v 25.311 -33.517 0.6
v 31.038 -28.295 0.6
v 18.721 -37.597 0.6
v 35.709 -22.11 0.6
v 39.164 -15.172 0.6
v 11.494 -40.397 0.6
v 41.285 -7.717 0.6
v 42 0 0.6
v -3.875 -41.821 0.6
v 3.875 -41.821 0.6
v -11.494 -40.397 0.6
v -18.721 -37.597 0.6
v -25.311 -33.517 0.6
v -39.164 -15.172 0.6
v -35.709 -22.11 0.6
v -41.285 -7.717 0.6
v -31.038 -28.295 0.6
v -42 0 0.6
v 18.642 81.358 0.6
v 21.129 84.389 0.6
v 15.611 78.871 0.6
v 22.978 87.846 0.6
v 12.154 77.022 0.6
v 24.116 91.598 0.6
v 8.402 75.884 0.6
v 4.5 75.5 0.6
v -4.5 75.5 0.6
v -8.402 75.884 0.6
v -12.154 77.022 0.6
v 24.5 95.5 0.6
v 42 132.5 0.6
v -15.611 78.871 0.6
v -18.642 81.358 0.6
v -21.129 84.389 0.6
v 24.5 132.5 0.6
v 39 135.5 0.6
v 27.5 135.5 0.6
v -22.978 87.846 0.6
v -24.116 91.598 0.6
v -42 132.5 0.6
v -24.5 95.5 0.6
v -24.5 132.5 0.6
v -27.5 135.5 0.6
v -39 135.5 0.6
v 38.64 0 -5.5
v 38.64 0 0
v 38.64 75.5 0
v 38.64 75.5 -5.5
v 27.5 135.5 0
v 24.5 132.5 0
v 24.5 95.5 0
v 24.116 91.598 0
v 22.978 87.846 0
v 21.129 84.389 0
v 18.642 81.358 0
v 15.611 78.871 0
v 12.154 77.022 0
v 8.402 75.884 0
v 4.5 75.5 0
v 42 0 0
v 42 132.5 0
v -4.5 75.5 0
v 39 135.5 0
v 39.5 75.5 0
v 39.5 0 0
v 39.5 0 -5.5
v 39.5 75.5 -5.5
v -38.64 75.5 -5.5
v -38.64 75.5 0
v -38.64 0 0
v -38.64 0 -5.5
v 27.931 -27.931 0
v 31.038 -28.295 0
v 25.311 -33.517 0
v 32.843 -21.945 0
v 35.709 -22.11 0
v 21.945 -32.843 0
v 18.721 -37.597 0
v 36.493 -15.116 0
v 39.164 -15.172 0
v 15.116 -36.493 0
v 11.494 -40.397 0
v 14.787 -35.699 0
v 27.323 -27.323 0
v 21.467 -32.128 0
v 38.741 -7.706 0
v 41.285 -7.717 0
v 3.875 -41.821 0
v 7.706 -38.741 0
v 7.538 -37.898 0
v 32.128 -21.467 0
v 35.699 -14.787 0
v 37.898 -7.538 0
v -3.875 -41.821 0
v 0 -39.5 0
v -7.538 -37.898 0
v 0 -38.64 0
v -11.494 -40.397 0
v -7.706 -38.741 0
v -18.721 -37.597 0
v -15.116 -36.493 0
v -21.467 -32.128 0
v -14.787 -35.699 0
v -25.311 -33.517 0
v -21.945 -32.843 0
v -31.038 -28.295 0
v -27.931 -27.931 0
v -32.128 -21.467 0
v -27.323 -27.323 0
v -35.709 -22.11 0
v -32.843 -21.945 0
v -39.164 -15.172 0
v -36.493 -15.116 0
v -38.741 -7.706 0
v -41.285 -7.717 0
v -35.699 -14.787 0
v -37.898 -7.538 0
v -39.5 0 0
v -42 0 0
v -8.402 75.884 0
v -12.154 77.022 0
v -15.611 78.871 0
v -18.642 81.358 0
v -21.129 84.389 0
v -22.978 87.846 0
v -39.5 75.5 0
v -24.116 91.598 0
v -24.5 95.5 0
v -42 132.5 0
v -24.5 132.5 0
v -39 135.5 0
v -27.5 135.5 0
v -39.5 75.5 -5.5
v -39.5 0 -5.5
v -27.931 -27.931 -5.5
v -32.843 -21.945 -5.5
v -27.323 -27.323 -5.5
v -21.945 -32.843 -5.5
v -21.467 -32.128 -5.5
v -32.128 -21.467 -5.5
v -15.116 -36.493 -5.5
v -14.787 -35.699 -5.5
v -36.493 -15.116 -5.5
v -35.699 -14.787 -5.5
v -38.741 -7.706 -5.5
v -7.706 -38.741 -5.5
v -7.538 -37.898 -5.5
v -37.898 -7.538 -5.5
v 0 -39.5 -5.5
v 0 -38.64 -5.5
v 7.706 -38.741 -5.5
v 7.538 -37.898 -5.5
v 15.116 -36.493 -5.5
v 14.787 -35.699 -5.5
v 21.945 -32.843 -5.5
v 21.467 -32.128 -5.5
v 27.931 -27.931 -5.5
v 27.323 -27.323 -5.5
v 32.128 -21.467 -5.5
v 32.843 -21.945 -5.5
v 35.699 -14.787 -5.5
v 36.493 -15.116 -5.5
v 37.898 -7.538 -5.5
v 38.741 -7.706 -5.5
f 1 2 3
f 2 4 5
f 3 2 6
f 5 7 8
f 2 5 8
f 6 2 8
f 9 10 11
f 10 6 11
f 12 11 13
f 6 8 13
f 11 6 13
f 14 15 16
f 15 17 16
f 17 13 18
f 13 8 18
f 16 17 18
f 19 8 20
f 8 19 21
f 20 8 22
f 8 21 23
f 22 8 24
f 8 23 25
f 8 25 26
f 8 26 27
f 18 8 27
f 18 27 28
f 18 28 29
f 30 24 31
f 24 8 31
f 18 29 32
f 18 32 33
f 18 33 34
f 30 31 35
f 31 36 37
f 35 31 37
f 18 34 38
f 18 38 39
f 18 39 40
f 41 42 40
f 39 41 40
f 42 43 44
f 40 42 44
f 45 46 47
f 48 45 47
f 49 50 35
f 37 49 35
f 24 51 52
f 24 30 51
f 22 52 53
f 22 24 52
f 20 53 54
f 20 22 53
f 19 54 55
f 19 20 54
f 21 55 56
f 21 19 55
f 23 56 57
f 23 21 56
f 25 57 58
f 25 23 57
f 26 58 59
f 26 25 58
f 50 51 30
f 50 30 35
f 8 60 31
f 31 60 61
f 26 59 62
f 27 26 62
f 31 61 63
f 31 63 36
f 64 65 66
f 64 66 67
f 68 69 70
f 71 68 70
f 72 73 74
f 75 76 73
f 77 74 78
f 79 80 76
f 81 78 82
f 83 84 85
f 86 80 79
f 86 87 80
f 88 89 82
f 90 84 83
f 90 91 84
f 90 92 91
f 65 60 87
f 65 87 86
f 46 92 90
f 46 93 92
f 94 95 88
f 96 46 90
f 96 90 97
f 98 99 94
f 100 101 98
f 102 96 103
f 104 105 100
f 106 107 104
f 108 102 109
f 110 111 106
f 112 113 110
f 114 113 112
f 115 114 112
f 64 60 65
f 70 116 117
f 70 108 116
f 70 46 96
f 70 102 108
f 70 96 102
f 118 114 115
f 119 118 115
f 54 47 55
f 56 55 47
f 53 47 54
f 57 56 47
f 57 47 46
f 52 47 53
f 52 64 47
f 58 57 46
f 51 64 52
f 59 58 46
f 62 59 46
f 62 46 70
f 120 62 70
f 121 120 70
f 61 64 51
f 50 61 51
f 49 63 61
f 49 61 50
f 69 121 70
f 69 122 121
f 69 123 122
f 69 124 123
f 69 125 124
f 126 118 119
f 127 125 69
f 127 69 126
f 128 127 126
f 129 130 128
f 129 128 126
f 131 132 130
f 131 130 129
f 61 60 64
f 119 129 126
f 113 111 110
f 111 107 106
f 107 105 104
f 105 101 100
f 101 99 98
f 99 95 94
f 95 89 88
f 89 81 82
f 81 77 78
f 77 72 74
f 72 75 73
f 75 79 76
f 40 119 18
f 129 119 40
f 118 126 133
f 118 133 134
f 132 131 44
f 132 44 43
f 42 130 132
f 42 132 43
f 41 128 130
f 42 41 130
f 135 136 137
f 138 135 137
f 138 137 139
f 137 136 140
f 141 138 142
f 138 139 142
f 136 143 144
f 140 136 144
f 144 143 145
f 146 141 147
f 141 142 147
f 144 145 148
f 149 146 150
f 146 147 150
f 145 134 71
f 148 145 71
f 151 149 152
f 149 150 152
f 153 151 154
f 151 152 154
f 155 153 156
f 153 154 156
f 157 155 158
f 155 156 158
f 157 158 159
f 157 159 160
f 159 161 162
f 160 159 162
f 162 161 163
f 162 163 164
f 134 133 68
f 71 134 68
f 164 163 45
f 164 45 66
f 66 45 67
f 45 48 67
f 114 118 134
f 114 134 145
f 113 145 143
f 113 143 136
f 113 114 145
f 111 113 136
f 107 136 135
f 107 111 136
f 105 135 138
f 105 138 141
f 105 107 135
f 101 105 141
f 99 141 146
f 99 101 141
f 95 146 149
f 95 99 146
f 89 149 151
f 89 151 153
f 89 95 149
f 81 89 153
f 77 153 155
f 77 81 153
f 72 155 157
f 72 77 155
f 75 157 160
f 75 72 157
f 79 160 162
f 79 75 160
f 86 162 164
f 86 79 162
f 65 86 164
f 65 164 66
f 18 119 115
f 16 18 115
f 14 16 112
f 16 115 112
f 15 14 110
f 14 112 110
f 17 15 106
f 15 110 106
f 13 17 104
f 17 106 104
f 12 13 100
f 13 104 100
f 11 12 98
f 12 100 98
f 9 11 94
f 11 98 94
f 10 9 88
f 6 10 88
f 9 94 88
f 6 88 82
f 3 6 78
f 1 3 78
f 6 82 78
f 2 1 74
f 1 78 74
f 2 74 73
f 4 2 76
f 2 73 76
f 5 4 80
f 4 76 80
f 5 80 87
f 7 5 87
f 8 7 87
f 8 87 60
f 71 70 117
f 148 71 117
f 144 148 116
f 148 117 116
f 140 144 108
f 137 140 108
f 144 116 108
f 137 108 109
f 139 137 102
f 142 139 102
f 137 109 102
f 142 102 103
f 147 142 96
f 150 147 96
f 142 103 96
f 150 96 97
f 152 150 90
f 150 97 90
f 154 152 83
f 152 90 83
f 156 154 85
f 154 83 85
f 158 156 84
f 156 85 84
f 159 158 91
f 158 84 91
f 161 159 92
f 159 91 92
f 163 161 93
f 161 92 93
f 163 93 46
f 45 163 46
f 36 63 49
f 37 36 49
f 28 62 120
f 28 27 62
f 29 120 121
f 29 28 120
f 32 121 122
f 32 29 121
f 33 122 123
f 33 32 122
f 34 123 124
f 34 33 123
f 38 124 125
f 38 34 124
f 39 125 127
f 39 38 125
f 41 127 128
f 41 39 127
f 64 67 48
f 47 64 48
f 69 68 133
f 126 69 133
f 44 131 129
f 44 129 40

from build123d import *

# Parameters (mm, degrees)
PAD_DEPTH    = 5.5
THICKNESS_T  = -0.86
PAD001_DEPTH = 0.6
SKETCH002_W  = 17.5
SKETCH002_H  = 60
PAD002_DEPTH = 0.6
CHAMFER_SIZE = 3
FILLET_R     = 20


with BuildPart() as part:
    # Sketch → Pad (new body)
    with BuildSketch(Plane.XY):
        with BuildLine():
            Line((-39.5, 75.5), (-39.5, 0))
            ThreePointArc((-39.5, 0), (0, -39.5), (39.5, 0))
            Line((39.5, 0), (39.5, 75.5))
            Line((39.5, 75.5), (-39.5, 75.5))
        make_face()
    extrude(amount=-PAD_DEPTH)

    # Thickness
    thickness_openings = [part.faces().sort_by_distance(p)[0] for p in [
        (0, 21.873555, 0),
        (0, 75.5, -2.75),
        (0, 21.873555, -5.5),
    ]]
    offset(amount=THICKNESS_T, openings=thickness_openings)

    # Sketch001 → Pad001 (join)
    with BuildSketch(Plane.XY):
        with BuildLine():
            Line((-42, 75.5), (-42, 0))
            ThreePointArc((-42, 0), (0, -42), (42, 0))
            Line((42, 0), (42, 75.5))
            Line((42, 75.5), (-42, 75.5))
        make_face()
    extrude(amount=PAD001_DEPTH)

    # Sketch002 → Pad002 (join)
    with BuildSketch(Plane.XY):
        with Locations((-33.25, 105.5)):
            Rectangle(SKETCH002_W, SKETCH002_H)
    pad002 = extrude(amount=PAD002_DEPTH)

    # Mirrored: Pad002 across Sketch002 V_Axis
    add(pad002.mirror(Plane(origin=(0, 0, 0), x_dir=(0, 0, 1), z_dir=(1, 0, 0))))

    # Chamfer
    chamfer_edges = [part.edges().sort_by_distance(p)[0] for p in [
        (-24.5, 135.5, 0.3),
        (24.5, 135.5, 0.3),
        (-42, 135.5, 0.3),
        (42, 135.5, 0.3),
    ]]
    chamfer(chamfer_edges, length=CHAMFER_SIZE)

    # Fillet
    fillet_edges = [part.edges().sort_by_distance(p)[0] for p in [
        (24.5, 75.5, 0.3),
        (-24.5, 75.5, 0.3),
    ]]
    fillet(fillet_edges, radius=FILLET_R)


solid = part.part
